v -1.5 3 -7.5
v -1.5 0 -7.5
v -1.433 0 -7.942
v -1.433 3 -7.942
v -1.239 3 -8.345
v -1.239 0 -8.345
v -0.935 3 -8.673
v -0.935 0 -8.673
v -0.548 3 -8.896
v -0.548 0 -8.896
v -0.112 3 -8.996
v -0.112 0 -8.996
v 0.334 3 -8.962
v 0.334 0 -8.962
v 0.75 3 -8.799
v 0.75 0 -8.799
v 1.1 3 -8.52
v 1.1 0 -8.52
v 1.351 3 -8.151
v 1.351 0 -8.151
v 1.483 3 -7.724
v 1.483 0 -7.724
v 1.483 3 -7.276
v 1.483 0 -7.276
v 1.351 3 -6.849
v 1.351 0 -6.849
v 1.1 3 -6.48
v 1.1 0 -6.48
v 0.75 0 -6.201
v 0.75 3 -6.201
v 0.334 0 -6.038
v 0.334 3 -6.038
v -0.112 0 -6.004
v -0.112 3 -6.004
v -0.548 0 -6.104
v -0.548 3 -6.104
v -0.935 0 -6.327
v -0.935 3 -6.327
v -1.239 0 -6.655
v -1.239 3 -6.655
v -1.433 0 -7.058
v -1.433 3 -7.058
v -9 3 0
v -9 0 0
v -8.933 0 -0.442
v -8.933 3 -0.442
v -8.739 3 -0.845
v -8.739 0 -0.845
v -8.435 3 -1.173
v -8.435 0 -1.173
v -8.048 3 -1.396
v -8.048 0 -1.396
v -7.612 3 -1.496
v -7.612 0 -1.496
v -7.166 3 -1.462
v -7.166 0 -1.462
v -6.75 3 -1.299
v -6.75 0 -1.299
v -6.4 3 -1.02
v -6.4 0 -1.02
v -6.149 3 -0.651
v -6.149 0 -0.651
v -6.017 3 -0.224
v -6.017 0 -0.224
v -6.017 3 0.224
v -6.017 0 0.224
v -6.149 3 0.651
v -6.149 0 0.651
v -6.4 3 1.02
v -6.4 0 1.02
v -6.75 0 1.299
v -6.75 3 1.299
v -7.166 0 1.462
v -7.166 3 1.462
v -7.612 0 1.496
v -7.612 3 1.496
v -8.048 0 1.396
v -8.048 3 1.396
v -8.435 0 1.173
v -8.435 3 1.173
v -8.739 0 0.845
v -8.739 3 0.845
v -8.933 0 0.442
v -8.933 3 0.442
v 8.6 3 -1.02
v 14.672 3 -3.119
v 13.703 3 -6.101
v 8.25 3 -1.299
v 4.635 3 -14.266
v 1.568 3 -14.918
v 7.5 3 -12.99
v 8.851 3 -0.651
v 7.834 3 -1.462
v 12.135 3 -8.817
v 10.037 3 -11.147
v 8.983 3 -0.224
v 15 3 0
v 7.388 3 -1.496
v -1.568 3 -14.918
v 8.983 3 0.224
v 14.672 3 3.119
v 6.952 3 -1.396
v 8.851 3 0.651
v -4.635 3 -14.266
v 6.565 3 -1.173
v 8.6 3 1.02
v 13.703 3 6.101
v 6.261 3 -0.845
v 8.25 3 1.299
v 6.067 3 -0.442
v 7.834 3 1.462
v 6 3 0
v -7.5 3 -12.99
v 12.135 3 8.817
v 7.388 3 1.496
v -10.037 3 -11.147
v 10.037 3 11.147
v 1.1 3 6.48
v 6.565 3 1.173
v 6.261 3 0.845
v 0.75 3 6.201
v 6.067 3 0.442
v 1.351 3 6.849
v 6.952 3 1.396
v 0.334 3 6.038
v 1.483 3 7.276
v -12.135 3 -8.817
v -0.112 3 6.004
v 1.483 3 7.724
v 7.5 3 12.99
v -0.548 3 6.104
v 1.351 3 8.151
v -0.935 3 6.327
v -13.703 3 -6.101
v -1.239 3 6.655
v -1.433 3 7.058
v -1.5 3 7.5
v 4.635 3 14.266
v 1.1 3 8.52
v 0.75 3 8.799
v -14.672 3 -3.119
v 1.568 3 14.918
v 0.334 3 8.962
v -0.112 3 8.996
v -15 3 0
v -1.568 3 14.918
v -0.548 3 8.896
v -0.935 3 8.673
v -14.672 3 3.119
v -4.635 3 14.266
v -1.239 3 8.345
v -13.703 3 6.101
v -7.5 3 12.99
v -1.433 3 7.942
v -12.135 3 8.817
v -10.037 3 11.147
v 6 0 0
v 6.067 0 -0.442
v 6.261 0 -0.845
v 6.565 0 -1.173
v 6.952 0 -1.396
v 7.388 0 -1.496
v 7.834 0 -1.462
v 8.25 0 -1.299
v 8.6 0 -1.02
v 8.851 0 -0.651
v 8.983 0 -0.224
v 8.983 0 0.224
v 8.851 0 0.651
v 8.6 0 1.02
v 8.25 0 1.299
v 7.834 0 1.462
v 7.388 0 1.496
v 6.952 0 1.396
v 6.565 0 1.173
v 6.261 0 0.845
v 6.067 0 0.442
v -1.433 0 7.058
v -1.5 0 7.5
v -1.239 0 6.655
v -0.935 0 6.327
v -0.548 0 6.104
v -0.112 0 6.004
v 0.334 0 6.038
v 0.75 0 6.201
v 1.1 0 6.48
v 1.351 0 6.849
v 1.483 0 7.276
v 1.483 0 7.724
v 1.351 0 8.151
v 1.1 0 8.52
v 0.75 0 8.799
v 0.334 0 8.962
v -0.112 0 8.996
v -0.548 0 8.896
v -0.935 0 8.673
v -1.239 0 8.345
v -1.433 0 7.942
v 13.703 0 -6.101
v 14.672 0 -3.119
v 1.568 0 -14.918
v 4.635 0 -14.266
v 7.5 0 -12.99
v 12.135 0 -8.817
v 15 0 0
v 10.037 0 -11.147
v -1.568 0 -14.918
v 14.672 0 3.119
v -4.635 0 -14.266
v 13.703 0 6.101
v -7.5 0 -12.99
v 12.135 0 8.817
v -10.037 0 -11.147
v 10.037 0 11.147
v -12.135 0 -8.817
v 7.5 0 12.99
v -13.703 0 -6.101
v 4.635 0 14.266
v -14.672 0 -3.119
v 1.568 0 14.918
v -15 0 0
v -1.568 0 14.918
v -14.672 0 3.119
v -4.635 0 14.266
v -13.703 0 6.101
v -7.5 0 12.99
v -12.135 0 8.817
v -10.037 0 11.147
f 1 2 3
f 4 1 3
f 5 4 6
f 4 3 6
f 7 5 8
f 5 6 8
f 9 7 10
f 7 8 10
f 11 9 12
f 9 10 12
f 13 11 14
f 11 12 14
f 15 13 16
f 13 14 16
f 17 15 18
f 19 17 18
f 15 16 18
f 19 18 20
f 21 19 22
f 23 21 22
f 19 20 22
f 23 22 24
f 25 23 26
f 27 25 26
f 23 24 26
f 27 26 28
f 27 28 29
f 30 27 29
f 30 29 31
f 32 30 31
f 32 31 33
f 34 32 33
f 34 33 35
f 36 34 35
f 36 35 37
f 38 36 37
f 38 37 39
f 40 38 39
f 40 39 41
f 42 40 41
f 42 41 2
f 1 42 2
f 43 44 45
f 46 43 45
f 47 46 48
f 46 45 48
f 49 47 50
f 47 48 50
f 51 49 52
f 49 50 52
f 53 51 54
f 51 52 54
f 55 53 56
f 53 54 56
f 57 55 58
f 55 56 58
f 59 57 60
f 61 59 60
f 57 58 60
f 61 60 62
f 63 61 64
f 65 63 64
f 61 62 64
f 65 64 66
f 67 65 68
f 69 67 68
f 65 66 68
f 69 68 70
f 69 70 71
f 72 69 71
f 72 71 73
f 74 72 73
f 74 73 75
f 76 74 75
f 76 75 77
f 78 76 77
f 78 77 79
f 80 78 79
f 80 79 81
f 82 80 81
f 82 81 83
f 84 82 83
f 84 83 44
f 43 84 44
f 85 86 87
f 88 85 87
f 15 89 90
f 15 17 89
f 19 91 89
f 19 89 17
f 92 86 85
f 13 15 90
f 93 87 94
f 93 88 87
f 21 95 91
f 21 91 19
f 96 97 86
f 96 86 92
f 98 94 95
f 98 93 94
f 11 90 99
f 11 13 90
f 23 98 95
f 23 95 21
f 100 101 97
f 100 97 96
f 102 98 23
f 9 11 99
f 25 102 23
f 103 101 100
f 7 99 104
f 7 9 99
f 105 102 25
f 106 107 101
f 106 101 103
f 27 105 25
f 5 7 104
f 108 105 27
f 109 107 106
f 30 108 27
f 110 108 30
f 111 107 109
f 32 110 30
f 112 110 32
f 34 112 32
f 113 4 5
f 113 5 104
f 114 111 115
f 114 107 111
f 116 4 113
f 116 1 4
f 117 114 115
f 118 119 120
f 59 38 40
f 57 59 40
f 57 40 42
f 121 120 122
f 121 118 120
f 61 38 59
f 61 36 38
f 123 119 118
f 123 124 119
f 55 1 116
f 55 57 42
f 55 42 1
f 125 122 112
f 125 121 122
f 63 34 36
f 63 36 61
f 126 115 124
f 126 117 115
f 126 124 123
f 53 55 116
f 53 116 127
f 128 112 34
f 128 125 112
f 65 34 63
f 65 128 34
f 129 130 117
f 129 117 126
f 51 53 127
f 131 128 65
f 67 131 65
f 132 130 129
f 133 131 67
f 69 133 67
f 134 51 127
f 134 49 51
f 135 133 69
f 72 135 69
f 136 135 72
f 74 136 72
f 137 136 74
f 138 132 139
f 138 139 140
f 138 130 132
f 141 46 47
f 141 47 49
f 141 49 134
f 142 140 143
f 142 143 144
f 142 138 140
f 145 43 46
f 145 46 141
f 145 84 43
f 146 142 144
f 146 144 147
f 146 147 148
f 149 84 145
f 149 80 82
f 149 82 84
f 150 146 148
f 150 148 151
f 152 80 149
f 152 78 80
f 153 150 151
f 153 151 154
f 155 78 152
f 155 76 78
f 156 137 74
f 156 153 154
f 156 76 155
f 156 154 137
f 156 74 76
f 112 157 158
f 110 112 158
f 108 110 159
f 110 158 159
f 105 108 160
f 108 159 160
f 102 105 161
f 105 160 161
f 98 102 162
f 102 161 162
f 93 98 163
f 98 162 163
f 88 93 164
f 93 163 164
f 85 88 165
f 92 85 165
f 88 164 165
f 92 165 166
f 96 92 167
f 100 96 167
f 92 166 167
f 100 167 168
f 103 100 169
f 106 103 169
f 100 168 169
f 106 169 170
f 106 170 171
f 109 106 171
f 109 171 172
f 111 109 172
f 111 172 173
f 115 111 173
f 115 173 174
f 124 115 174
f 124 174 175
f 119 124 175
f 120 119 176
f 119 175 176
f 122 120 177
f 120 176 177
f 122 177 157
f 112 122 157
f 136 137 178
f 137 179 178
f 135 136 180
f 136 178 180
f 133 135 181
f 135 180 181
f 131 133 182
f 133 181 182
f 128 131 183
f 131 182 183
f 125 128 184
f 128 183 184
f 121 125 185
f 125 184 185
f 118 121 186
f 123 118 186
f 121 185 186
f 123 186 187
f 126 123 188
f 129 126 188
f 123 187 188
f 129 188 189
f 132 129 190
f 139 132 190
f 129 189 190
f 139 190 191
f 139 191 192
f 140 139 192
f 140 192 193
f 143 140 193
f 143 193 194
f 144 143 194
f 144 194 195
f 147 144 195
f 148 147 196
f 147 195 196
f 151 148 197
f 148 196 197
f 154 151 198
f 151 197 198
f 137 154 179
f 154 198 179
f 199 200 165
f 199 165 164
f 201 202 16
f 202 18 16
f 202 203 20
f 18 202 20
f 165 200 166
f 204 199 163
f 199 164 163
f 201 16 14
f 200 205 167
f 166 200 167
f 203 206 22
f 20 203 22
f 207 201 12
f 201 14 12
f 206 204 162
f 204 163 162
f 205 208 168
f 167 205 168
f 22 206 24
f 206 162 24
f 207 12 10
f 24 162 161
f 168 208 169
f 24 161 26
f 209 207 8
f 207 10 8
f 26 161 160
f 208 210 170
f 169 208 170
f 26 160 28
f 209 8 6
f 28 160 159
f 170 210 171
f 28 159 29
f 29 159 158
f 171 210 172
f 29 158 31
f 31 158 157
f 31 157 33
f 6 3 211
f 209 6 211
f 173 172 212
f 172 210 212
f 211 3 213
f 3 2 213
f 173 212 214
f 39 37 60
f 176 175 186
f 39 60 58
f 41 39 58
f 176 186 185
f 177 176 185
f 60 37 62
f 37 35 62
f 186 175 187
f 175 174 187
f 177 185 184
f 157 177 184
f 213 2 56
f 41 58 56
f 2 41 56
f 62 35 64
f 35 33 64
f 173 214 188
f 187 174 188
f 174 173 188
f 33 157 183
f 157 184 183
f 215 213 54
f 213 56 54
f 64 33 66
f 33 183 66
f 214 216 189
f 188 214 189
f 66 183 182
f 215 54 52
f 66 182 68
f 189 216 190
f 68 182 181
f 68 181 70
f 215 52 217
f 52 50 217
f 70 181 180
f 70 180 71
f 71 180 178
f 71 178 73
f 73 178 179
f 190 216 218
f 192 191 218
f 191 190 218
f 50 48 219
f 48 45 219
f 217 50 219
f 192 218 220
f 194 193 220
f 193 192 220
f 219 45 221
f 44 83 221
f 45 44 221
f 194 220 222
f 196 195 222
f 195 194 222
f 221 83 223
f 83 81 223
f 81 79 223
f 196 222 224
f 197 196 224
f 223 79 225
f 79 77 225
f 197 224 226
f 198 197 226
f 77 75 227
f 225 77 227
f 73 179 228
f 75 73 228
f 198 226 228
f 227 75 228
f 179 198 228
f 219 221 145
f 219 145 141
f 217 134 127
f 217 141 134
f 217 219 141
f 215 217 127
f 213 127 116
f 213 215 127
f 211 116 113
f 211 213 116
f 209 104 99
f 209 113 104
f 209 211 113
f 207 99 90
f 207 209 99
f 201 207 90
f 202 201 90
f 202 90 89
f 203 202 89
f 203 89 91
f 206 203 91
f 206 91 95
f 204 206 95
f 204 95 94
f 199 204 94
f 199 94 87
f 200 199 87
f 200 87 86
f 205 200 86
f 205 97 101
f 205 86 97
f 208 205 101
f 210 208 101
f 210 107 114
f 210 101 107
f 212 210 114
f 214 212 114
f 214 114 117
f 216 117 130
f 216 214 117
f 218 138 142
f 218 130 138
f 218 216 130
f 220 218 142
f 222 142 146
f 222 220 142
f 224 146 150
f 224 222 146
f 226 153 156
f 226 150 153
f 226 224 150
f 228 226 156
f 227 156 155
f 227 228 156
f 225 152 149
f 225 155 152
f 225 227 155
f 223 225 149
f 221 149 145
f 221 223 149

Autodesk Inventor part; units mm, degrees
ref_plane "YZ Plane" through (0, 0, 0) normal (1, 0, 0) x (0, 1, 0)
ref_plane "XZ Plane" through (0, 0, 0) normal (0, 1, 0) x (-1, 0, 0)
ref_plane "XY Plane" through (0, 0, 0) normal (0, 0, 1) x (1, 0, 0)
sketch "Sketch1" plane through (0, 0, 0) normal (0, 1, 0) x (-1, 0, 0)
  circle A0 centre (0, 0) radius 15
  circle A1 centre (0, 0) radius 7.5
  circle A2 centre (0, 7.5) radius 1.5
  circle A3 centre (0, -7.5) radius 1.5
  circle A4 centre (7.5, 0) radius 1.5
  circle A5 centre (-7.5, 0) radius 1.5
  dimension "d0" = 30
  dimension "d1" = 15
  dimension "d2" = 3
  dimension "d3" = 3
  dimension "d4" = 3
  dimension "d5" = 3
extrude "Extrusion1" add sketch "Sketch1" along normal blind 3 contours A0 | A4 A1 A3 A5 A2
properties part number "gearwheel_small"
